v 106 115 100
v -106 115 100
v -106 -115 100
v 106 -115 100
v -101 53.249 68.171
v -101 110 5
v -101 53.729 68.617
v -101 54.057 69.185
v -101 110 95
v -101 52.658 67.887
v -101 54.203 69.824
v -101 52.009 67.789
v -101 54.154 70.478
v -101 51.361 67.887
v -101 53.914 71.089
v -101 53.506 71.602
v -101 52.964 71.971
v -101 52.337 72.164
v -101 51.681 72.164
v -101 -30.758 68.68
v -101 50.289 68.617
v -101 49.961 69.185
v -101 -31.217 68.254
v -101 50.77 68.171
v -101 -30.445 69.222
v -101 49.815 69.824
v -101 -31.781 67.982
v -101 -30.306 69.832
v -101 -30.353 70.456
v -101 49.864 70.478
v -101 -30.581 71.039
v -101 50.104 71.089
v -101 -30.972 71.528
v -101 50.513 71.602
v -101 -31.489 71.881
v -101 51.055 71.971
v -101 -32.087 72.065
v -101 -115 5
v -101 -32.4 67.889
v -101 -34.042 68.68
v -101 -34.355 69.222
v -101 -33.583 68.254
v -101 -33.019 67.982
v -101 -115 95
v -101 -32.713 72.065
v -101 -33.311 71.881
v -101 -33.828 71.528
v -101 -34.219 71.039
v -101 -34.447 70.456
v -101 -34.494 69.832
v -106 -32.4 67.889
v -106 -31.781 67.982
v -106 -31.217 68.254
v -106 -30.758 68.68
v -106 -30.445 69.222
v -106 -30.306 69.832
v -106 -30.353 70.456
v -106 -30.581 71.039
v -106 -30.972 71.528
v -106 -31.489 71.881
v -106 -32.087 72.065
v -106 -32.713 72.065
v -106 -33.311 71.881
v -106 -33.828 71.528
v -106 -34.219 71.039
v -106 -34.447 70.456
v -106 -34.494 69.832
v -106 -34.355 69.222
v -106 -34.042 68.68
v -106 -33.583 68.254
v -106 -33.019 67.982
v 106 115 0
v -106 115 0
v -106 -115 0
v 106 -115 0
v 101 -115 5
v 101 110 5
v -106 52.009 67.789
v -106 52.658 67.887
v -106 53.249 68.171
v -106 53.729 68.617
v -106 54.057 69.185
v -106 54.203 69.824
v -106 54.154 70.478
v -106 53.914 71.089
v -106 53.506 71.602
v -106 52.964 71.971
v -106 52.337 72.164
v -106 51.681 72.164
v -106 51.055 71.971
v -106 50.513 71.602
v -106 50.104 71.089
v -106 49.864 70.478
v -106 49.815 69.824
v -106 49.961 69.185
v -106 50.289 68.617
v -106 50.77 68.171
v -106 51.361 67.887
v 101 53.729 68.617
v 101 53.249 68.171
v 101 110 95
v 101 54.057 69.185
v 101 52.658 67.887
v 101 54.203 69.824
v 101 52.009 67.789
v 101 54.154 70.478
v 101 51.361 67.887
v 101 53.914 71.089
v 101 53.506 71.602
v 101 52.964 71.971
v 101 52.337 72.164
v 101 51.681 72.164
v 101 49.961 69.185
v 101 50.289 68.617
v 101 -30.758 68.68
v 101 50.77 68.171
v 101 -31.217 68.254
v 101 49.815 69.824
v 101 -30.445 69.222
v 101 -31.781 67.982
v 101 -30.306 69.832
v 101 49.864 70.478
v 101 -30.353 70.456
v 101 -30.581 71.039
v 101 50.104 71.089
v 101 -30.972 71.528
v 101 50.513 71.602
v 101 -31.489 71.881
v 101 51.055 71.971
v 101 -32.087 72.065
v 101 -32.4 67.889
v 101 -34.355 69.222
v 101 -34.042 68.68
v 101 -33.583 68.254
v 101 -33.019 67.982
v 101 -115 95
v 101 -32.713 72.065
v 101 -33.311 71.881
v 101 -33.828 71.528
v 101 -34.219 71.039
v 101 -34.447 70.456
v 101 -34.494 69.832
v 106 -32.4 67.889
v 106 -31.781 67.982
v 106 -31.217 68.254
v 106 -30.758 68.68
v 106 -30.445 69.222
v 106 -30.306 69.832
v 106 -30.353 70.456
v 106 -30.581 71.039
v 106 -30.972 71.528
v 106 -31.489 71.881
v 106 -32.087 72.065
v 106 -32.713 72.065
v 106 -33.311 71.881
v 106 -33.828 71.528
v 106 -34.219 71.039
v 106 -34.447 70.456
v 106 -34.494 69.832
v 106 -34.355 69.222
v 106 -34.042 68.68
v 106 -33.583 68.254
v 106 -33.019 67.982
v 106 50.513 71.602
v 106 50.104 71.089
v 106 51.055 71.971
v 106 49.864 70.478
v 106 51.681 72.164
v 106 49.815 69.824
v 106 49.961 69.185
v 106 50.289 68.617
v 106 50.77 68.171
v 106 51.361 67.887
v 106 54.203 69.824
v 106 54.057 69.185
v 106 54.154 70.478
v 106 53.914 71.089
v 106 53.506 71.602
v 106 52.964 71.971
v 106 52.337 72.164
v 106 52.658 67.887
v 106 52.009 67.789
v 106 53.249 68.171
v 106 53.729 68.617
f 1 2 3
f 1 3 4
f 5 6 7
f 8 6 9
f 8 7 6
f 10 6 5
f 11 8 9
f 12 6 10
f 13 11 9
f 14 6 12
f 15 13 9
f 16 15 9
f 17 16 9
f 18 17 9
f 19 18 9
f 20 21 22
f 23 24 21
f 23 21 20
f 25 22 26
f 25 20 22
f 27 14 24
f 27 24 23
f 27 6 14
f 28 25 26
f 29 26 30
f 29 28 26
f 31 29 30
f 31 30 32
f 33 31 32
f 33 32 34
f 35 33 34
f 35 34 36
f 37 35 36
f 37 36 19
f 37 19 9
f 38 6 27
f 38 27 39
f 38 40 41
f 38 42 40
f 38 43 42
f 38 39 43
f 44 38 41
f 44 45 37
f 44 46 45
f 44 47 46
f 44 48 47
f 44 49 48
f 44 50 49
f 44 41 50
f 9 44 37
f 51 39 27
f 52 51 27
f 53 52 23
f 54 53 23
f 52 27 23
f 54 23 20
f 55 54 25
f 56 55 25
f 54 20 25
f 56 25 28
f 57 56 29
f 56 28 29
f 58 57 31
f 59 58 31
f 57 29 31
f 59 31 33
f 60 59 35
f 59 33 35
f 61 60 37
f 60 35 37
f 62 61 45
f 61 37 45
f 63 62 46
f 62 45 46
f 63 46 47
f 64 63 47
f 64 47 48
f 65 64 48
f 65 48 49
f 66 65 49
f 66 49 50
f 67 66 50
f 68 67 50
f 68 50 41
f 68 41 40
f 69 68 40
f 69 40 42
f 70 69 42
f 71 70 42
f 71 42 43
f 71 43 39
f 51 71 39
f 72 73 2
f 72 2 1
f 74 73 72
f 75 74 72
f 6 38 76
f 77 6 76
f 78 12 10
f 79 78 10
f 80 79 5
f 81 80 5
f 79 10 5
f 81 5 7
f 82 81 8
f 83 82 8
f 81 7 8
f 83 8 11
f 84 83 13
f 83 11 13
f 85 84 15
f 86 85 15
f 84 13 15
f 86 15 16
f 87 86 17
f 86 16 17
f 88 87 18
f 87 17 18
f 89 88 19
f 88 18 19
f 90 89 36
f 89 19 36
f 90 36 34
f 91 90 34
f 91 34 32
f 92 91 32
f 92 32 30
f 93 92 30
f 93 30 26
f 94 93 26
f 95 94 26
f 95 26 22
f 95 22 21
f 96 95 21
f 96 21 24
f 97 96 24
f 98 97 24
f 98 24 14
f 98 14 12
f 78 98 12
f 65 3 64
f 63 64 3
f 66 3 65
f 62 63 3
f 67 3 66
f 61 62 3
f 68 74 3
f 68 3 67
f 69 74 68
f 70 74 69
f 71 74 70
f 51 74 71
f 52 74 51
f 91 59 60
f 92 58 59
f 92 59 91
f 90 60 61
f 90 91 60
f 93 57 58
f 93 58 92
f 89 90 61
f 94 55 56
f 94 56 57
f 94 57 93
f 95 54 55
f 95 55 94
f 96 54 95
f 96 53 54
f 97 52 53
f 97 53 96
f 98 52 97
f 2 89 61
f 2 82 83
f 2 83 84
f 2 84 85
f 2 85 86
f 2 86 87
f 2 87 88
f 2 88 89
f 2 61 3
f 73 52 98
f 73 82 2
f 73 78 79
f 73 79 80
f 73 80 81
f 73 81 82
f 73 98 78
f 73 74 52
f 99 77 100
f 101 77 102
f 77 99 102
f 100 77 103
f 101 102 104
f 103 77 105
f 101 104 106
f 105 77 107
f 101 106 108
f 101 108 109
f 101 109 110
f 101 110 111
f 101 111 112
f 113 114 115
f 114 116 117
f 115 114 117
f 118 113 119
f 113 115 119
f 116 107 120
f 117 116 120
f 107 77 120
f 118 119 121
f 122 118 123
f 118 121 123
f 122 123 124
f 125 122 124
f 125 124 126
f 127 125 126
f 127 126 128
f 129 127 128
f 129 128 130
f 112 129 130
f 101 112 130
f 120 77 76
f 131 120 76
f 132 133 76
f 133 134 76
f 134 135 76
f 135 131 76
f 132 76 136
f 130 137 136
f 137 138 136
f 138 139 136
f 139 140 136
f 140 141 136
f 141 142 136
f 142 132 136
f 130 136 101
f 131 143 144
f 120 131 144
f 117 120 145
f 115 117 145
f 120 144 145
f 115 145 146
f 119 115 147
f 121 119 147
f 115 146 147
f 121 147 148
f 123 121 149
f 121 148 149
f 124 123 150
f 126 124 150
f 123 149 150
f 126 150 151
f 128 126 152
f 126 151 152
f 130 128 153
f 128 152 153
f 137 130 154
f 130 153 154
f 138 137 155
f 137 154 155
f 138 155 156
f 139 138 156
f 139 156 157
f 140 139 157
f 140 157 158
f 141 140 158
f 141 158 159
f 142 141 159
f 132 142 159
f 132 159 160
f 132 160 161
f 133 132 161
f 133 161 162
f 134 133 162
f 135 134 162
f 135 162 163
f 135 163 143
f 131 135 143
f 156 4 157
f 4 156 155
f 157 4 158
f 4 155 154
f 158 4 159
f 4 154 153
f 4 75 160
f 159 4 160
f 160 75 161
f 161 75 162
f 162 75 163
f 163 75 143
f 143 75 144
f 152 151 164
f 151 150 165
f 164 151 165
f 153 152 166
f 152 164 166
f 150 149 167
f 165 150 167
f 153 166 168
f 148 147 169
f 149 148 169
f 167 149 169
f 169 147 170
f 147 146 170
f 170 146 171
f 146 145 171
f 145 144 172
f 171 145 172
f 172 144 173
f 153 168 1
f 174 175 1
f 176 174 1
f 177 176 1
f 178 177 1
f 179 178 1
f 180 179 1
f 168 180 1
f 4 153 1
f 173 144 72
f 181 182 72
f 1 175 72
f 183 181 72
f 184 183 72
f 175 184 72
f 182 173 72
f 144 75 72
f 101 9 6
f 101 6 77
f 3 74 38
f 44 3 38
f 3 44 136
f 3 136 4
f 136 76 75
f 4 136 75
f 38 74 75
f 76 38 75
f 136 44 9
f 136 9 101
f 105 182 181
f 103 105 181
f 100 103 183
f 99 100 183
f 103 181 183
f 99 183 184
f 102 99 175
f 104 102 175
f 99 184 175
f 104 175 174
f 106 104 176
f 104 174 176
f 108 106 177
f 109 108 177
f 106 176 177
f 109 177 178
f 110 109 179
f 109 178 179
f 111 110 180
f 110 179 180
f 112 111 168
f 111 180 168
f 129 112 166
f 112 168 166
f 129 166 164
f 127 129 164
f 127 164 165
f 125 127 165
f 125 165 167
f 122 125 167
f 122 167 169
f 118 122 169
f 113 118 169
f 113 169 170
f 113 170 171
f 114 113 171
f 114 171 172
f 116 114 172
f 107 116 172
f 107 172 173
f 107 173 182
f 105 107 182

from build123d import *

# Parameters (mm, degrees)
SKETCH_1_W          = 212
SKETCH_1_H          = 230
EXTRUDE_1_DEPTH     = 100
SKETCH_2_W          = 202
SKETCH_2_H          = 90
CUT_EXTRUDE_1_DEPTH = 225
SKETCH_5_R          = 2.2
CUT_EXTRUDE_4_DEPTH = 238
SKETCH_6_R          = 2.1
CUT_EXTRUDE_5_DEPTH = 237


with BuildPart() as part:
    # 草圖1 → 填料-伸長1 (new body)
    with BuildSketch(Plane.XY):
        Rectangle(SKETCH_1_W, SKETCH_1_H)
    extrude(amount=EXTRUDE_1_DEPTH)

    # 草圖2 → 除料-伸長1 (cut)
    with BuildSketch(Plane.XZ.offset(115)):
        with Locations((0, 50)):
            Rectangle(SKETCH_2_W, SKETCH_2_H)
    extrude(amount=-CUT_EXTRUDE_1_DEPTH, mode=Mode.SUBTRACT)

    # 草圖5 → 除料-伸長4 (cut)
    with BuildSketch(Plane(origin=(106, 0, 0), x_dir=(0, 0, -1), z_dir=(1, 0, 0))):
        with Locations((-69.988851691, 52.009212606)):
            Circle(SKETCH_5_R)
    extrude(amount=-CUT_EXTRUDE_4_DEPTH, mode=Mode.SUBTRACT)

    # 草圖6 → 除料-伸長5 (cut)
    with BuildSketch(Plane(origin=(106, 0, 0), x_dir=(0, 0, -1), z_dir=(1, 0, 0))):
        with Locations((-69.988851691, -32.4)):
            Circle(SKETCH_6_R)
    extrude(amount=-CUT_EXTRUDE_5_DEPTH, mode=Mode.SUBTRACT)


solid = part.part
